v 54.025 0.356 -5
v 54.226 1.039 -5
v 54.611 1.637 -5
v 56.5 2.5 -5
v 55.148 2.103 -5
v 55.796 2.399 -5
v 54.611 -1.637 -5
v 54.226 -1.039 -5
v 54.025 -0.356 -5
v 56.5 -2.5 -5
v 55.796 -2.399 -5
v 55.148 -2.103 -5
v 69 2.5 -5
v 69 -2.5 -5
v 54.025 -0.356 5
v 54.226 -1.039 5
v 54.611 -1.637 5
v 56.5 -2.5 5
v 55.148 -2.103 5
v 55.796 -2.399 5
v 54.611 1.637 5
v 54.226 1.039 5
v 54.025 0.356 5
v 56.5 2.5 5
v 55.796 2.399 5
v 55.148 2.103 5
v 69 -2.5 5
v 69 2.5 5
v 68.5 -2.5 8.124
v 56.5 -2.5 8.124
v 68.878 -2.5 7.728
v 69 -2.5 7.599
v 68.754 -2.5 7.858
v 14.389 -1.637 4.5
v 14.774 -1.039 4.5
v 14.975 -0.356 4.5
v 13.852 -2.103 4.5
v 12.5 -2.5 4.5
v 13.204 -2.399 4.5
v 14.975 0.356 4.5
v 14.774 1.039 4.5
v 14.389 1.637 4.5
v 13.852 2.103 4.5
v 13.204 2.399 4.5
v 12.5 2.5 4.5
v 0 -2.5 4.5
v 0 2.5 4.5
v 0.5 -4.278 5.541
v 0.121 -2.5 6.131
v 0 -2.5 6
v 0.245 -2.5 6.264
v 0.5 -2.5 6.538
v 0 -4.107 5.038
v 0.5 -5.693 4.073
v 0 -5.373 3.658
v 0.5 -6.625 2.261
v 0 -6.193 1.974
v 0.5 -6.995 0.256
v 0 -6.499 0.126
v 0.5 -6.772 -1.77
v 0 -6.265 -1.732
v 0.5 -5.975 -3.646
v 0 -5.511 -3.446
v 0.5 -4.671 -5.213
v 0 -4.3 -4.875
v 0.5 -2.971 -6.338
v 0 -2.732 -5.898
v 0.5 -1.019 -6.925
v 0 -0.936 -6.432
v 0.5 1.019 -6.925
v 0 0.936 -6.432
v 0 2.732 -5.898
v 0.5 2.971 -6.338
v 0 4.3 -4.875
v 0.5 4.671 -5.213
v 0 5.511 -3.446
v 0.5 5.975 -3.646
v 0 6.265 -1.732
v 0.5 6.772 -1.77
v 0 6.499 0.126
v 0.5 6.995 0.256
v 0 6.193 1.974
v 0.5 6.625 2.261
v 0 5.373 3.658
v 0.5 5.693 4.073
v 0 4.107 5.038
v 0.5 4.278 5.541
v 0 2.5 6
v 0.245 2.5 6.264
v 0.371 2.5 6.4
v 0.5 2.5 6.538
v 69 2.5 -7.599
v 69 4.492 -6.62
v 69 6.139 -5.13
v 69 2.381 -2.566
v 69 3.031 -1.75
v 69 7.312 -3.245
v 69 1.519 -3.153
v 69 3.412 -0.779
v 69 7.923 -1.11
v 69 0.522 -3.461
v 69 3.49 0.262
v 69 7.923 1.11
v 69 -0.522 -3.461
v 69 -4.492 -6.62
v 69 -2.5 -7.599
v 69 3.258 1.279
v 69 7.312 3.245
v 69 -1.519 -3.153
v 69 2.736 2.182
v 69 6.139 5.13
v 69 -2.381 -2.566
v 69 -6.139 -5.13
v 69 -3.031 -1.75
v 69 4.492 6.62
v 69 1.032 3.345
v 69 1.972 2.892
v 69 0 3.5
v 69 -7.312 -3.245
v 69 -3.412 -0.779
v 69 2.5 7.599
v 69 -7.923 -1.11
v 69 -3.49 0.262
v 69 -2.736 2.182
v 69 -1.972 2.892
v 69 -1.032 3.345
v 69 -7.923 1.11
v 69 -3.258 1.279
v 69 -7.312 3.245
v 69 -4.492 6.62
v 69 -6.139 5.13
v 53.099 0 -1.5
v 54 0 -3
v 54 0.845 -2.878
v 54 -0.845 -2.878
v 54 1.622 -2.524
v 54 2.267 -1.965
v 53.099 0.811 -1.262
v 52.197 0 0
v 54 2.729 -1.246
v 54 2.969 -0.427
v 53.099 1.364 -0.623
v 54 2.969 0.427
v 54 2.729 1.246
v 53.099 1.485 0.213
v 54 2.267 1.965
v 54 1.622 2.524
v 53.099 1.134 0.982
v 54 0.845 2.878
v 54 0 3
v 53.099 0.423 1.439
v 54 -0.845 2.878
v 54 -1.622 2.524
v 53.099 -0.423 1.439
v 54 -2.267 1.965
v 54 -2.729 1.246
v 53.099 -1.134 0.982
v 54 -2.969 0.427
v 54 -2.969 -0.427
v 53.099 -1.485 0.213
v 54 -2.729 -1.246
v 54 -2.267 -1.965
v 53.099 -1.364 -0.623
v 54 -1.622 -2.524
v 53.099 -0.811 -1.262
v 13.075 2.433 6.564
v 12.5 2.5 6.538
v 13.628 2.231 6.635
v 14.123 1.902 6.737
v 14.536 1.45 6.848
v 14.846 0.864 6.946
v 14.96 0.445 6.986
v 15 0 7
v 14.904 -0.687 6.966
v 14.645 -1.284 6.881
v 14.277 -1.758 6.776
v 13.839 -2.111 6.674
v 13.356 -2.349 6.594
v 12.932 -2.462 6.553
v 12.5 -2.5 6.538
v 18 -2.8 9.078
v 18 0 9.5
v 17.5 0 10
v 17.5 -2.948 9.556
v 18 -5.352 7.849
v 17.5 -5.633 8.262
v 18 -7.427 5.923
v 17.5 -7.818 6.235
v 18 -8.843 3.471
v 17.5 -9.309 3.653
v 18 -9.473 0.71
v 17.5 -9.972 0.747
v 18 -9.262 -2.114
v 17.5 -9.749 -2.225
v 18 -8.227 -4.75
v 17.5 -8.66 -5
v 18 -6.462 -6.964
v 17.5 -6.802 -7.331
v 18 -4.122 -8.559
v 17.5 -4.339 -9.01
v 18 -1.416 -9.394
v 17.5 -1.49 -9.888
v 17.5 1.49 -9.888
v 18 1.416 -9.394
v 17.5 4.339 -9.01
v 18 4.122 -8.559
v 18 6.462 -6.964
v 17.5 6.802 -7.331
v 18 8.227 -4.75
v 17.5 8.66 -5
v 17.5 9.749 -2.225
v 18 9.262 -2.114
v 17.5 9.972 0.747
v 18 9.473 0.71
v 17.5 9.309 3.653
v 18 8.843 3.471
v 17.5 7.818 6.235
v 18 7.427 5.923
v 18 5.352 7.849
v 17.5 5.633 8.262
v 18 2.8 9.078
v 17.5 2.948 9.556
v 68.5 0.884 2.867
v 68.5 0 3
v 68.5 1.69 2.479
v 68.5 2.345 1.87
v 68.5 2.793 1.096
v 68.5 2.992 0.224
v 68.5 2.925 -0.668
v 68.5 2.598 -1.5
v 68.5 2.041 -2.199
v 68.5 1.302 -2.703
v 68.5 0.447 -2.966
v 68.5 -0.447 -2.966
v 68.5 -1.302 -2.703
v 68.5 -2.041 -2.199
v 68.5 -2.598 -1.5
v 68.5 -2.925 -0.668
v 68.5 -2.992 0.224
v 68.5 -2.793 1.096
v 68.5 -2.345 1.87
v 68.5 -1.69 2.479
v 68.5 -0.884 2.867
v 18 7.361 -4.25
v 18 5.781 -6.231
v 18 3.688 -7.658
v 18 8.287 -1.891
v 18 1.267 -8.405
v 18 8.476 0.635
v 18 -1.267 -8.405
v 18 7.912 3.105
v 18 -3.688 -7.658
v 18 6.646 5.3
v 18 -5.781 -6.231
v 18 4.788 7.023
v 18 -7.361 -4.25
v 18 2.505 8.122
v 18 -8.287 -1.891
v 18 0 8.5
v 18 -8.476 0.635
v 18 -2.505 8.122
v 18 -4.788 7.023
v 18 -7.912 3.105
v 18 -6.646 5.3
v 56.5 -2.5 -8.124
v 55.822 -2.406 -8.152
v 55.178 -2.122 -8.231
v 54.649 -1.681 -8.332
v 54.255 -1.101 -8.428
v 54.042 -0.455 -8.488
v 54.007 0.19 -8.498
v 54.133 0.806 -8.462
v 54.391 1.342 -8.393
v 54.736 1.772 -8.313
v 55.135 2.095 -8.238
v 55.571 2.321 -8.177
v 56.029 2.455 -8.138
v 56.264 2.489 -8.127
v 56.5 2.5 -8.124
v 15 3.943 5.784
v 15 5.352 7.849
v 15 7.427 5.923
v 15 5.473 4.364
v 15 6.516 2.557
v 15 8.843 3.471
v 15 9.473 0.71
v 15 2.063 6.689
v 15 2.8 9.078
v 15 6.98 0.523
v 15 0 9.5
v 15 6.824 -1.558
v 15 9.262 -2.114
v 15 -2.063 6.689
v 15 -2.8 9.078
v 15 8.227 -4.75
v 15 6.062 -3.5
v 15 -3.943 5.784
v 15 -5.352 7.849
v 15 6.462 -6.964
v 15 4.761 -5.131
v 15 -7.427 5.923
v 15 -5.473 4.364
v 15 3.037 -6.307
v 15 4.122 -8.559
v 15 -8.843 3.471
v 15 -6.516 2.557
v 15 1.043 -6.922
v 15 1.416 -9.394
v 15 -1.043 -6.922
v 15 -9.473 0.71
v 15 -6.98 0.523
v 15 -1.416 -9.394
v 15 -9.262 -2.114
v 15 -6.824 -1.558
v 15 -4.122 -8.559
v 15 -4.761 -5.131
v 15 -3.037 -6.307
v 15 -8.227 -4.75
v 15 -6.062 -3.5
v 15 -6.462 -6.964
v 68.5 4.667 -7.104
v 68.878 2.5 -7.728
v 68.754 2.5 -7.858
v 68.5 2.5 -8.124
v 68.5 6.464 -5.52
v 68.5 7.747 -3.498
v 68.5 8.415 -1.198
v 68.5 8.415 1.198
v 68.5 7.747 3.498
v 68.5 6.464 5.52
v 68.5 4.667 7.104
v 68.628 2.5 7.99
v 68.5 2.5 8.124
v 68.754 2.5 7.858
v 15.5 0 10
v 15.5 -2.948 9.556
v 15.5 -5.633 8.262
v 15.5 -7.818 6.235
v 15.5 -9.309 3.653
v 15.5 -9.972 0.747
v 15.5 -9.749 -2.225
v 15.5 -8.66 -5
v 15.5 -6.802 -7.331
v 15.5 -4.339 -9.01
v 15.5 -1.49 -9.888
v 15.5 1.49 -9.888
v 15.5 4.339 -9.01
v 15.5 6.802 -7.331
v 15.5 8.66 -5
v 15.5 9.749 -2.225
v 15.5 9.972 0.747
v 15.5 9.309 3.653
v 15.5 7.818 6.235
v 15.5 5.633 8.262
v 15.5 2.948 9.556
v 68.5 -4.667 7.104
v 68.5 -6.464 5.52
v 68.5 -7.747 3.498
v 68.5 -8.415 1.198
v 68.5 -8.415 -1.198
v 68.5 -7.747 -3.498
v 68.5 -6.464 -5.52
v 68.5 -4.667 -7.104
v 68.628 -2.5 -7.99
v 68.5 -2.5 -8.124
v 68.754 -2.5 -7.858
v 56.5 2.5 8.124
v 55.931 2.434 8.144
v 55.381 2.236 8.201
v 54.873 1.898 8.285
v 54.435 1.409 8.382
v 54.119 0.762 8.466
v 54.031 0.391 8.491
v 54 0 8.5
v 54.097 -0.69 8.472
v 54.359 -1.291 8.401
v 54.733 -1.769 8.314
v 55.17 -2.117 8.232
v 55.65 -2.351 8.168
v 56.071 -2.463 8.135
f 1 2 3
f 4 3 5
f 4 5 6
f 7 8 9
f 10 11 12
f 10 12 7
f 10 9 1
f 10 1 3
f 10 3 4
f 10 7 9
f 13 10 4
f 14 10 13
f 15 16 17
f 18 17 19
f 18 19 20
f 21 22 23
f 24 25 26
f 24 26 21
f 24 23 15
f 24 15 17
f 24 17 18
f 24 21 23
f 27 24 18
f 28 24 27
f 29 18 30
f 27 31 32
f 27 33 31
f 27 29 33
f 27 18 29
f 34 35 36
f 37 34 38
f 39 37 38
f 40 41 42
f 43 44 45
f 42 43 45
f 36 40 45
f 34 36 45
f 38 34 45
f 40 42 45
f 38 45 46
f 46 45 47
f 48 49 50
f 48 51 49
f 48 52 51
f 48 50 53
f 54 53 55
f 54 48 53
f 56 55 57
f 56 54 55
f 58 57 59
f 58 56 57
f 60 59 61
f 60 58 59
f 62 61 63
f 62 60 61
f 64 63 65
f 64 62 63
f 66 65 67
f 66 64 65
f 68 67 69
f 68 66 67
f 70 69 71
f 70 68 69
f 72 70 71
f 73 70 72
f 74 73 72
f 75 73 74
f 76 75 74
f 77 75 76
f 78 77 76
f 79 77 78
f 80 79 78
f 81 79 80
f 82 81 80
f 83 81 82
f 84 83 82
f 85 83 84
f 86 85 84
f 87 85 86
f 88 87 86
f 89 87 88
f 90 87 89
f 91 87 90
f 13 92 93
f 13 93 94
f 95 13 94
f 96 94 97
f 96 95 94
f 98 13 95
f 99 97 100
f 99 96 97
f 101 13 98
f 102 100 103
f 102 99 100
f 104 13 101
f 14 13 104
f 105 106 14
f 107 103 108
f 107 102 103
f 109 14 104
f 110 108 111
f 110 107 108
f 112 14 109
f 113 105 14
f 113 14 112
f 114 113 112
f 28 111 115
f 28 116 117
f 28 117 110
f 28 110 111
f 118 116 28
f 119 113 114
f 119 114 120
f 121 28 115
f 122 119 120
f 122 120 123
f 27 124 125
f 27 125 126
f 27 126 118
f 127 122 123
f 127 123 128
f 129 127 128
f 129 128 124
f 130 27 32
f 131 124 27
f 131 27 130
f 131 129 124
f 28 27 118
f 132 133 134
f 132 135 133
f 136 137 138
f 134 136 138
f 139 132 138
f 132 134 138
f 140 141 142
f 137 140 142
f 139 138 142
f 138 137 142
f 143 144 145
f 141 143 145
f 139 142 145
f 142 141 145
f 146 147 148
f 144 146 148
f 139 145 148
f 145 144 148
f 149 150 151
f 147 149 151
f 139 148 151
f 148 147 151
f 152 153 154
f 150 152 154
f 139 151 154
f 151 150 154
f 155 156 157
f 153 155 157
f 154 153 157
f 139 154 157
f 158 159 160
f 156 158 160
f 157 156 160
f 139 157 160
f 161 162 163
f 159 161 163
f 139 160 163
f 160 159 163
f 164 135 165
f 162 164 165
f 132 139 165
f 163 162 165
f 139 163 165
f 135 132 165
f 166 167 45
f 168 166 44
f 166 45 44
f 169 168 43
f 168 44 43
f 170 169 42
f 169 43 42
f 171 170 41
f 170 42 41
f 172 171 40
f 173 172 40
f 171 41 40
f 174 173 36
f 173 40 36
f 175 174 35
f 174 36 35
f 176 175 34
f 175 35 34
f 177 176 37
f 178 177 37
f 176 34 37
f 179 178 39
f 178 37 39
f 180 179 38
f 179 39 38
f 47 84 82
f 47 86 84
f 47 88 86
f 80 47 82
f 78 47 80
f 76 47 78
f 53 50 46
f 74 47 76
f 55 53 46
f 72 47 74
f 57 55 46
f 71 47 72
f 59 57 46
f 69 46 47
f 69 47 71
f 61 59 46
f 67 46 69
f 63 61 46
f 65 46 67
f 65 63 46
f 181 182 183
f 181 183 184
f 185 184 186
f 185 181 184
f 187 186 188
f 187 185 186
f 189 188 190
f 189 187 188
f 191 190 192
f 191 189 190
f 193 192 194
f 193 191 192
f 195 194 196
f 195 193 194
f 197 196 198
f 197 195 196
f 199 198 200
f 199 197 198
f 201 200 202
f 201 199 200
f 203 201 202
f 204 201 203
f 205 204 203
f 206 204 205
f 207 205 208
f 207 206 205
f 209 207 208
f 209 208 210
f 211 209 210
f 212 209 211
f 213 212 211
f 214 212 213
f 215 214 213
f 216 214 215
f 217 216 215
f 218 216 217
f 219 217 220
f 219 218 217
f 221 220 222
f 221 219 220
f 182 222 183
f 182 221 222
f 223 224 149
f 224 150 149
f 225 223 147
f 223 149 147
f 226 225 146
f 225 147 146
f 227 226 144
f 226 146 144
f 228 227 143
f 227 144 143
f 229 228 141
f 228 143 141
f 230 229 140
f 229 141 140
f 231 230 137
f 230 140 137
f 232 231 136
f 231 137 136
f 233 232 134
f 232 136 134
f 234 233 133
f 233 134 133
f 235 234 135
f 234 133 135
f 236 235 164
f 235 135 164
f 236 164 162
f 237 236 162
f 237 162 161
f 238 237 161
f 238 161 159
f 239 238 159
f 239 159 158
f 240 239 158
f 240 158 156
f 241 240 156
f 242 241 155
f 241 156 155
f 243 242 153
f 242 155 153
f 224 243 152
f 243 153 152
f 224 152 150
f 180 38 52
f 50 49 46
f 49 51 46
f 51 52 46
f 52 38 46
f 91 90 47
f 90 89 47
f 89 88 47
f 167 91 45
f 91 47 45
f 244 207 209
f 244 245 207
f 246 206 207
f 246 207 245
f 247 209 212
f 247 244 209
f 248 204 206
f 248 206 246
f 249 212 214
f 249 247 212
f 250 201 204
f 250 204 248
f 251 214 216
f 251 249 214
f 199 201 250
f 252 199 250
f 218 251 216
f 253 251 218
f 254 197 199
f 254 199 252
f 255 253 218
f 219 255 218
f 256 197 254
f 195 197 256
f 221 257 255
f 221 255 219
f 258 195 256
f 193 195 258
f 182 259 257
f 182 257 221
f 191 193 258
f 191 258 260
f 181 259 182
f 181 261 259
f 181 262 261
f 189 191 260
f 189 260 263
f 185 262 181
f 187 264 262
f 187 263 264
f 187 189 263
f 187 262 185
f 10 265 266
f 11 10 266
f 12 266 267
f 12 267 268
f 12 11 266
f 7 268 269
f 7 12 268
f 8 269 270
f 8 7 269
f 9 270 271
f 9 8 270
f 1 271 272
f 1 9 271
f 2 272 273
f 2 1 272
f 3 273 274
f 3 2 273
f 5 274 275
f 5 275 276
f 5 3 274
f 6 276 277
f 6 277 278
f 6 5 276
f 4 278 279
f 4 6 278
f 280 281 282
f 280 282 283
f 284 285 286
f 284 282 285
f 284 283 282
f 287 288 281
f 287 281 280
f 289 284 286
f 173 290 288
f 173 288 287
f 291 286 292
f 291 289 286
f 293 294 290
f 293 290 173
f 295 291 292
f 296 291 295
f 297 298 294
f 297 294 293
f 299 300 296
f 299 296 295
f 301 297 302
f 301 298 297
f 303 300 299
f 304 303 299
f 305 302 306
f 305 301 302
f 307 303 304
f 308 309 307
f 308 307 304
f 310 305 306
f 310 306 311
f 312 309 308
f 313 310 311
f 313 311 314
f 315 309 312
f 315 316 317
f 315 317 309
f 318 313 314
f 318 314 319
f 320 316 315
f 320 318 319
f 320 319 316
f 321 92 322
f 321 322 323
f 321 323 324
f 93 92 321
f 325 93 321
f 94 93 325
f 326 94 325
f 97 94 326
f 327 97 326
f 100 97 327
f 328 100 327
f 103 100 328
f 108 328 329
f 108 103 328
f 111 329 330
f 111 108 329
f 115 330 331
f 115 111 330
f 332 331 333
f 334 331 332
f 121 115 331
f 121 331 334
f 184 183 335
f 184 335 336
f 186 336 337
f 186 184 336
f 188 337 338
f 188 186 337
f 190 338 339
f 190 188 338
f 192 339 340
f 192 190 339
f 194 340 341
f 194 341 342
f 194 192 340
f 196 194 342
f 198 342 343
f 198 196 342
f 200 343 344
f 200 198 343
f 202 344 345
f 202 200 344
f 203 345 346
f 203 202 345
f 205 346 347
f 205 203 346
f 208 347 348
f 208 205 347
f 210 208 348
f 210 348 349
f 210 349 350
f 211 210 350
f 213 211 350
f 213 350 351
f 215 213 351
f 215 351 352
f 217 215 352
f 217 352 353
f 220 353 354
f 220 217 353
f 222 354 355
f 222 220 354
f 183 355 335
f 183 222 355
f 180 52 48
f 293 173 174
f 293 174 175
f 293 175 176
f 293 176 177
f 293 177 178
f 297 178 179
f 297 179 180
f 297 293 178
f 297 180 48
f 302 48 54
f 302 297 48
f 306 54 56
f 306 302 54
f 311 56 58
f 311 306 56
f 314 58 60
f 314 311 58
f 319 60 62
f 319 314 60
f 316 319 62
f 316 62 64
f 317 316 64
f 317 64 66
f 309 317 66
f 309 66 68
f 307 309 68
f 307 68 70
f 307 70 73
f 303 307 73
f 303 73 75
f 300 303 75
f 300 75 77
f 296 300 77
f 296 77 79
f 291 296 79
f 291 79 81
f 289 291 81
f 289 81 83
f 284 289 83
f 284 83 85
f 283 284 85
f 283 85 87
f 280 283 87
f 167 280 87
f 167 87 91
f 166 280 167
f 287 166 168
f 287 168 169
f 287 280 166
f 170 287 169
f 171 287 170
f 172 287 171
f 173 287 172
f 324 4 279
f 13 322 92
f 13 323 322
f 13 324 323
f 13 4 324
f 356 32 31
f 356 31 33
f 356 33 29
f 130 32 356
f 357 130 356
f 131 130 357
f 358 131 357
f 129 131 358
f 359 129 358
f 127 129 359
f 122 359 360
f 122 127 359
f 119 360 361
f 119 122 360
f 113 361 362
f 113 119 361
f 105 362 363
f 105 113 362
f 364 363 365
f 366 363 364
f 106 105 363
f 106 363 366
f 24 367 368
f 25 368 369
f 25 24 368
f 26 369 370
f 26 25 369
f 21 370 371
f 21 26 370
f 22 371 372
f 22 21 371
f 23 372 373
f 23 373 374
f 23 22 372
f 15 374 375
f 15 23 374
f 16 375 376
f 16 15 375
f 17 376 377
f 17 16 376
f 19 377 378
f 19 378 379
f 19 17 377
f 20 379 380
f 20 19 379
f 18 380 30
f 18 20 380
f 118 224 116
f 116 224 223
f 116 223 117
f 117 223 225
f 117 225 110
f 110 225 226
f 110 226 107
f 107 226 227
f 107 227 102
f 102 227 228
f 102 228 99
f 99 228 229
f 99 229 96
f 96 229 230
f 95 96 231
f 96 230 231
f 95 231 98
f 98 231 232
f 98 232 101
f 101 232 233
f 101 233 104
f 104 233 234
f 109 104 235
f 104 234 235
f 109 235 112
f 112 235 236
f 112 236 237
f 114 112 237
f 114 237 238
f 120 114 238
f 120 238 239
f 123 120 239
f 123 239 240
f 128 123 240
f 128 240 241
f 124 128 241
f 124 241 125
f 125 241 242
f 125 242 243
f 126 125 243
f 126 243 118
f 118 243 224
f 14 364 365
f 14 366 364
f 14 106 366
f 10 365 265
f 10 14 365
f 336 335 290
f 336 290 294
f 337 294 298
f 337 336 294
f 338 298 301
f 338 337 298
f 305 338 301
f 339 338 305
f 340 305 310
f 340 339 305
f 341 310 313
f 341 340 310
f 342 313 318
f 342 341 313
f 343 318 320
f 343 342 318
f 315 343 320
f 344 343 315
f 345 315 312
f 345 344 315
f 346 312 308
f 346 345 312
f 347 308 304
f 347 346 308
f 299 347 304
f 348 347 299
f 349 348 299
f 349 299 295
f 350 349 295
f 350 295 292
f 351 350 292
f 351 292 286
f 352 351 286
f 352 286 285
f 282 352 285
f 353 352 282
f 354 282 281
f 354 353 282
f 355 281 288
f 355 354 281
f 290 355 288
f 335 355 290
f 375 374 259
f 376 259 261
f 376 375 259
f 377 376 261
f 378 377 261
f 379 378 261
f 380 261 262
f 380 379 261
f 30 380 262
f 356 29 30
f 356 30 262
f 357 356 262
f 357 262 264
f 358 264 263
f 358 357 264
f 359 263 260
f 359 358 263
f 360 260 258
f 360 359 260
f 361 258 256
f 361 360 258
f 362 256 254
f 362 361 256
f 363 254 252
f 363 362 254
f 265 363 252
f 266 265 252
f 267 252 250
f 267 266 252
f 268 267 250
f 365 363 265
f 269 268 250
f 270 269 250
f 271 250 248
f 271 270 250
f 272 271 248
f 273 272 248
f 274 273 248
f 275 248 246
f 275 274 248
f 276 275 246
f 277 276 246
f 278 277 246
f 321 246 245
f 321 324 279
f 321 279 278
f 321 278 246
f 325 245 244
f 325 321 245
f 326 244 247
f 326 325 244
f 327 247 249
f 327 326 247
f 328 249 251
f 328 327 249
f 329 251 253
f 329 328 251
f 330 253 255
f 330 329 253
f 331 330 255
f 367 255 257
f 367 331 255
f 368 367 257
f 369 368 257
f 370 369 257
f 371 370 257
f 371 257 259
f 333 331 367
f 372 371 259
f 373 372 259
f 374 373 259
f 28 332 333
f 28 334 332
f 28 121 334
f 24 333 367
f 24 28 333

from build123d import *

# Parameters (mm, degrees)
CHAMFER_1_SIZE               = 0.5
HOLE_WIZARD_M6_1_D           = 6
HOLE_WIZARD_M6_1_DEPTH       = 15
HOLE_WIZARD_M6_1_CSINK_D     = 7
HOLE_WIZARD_M6_1_CSINK_ANGLE = 90
HOLE_WIZARD_M6_1_TIP         = 1.802581857
CUT_EXTRUDE_START            = 4.5
CUT_EXTRUDE_1_DEPTH          = 10
CUT_EXTRUDE_START_2          = 5
CUT_EXTRUDE_2_DEPTH          = 10
PATTERN_CIRCULAR_1_COUNT     = 2


with BuildPart() as part:
    # 草图1 → 旋转1 (revolve)
    with BuildSketch(Plane.XY, mode=Mode.PRIVATE) as revolve_1_sk:
        Polygon((0, 0), (0, 7), (15, 7), (15, 10), (18, 10), (18, 8.5), (69, 8.5), (69, 0), align=None)
    revolve(revolve_1_sk.sketch.rotate(Axis((0, 0, 0), (1, 0, 0)), 90), axis=Axis((0, 0, 0), (1, 0, 0)))

    # 倒角1
    chamfer_1_edges = [part.edges().sort_by_distance(p)[0] for p in [
        (69, 0, -8.5),
        (18, 0, -10),
        (15, 0, -10),
        (0, 0, -7),
    ]]
    chamfer(chamfer_1_edges, length=CHAMFER_1_SIZE)

    # M6 螺纹孔的螺纹孔钻头1
    with Locations(Plane(origin=(69, 0, 0), x_dir=(0, 0, -1), z_dir=(1, 0, 0))):
        with Locations((0, 0)):
            CounterSinkHole(HOLE_WIZARD_M6_1_D / 2, HOLE_WIZARD_M6_1_CSINK_D / 2, depth=HOLE_WIZARD_M6_1_DEPTH, counter_sink_angle=HOLE_WIZARD_M6_1_CSINK_ANGLE)
            with Locations((0, 0, -(HOLE_WIZARD_M6_1_DEPTH + HOLE_WIZARD_M6_1_TIP / 2))):  # 118° drill point
                Cone(0, HOLE_WIZARD_M6_1_D / 2, HOLE_WIZARD_M6_1_TIP, mode=Mode.SUBTRACT)

    # 草图4 → 切除-拉伸1 (cut)
    with BuildSketch(Plane.XY.offset(CUT_EXTRUDE_START)):
        with BuildLine():
            Line((0, 2.5), (12.5, 2.5))
            ThreePointArc((12.5, 2.5), (15, 0), (12.5, -2.5))
            Line((12.5, -2.5), (0, -2.5))
            Line((0, -2.5), (0, 2.5))
        make_face()
    extrude(amount=CUT_EXTRUDE_1_DEPTH, mode=Mode.SUBTRACT)

    # 草图5 → 切除-拉伸2 (cut)
    with BuildSketch(Plane.XY.offset(CUT_EXTRUDE_START_2)):
        with BuildLine():
            Line((69, 2.5), (56.5, 2.5))
            ThreePointArc((56.5, 2.5), (54, 0), (56.5, -2.5))
            Line((56.5, -2.5), (69, -2.5))
            Line((69, -2.5), (69, 2.5))
        make_face()
    cut_extrude_2 = extrude(amount=CUT_EXTRUDE_2_DEPTH, mode=Mode.SUBTRACT)

    # 阵列(圆周)1: 切除-拉伸2 ×2 about axis
    pattern_circular_1_axis = Axis((0, 0, 0), (1, 0, 0))
    for i in range(1, PATTERN_CIRCULAR_1_COUNT):
        add(cut_extrude_2.rotate(pattern_circular_1_axis, i * 360 / PATTERN_CIRCULAR_1_COUNT), mode=Mode.SUBTRACT)


solid = part.part
